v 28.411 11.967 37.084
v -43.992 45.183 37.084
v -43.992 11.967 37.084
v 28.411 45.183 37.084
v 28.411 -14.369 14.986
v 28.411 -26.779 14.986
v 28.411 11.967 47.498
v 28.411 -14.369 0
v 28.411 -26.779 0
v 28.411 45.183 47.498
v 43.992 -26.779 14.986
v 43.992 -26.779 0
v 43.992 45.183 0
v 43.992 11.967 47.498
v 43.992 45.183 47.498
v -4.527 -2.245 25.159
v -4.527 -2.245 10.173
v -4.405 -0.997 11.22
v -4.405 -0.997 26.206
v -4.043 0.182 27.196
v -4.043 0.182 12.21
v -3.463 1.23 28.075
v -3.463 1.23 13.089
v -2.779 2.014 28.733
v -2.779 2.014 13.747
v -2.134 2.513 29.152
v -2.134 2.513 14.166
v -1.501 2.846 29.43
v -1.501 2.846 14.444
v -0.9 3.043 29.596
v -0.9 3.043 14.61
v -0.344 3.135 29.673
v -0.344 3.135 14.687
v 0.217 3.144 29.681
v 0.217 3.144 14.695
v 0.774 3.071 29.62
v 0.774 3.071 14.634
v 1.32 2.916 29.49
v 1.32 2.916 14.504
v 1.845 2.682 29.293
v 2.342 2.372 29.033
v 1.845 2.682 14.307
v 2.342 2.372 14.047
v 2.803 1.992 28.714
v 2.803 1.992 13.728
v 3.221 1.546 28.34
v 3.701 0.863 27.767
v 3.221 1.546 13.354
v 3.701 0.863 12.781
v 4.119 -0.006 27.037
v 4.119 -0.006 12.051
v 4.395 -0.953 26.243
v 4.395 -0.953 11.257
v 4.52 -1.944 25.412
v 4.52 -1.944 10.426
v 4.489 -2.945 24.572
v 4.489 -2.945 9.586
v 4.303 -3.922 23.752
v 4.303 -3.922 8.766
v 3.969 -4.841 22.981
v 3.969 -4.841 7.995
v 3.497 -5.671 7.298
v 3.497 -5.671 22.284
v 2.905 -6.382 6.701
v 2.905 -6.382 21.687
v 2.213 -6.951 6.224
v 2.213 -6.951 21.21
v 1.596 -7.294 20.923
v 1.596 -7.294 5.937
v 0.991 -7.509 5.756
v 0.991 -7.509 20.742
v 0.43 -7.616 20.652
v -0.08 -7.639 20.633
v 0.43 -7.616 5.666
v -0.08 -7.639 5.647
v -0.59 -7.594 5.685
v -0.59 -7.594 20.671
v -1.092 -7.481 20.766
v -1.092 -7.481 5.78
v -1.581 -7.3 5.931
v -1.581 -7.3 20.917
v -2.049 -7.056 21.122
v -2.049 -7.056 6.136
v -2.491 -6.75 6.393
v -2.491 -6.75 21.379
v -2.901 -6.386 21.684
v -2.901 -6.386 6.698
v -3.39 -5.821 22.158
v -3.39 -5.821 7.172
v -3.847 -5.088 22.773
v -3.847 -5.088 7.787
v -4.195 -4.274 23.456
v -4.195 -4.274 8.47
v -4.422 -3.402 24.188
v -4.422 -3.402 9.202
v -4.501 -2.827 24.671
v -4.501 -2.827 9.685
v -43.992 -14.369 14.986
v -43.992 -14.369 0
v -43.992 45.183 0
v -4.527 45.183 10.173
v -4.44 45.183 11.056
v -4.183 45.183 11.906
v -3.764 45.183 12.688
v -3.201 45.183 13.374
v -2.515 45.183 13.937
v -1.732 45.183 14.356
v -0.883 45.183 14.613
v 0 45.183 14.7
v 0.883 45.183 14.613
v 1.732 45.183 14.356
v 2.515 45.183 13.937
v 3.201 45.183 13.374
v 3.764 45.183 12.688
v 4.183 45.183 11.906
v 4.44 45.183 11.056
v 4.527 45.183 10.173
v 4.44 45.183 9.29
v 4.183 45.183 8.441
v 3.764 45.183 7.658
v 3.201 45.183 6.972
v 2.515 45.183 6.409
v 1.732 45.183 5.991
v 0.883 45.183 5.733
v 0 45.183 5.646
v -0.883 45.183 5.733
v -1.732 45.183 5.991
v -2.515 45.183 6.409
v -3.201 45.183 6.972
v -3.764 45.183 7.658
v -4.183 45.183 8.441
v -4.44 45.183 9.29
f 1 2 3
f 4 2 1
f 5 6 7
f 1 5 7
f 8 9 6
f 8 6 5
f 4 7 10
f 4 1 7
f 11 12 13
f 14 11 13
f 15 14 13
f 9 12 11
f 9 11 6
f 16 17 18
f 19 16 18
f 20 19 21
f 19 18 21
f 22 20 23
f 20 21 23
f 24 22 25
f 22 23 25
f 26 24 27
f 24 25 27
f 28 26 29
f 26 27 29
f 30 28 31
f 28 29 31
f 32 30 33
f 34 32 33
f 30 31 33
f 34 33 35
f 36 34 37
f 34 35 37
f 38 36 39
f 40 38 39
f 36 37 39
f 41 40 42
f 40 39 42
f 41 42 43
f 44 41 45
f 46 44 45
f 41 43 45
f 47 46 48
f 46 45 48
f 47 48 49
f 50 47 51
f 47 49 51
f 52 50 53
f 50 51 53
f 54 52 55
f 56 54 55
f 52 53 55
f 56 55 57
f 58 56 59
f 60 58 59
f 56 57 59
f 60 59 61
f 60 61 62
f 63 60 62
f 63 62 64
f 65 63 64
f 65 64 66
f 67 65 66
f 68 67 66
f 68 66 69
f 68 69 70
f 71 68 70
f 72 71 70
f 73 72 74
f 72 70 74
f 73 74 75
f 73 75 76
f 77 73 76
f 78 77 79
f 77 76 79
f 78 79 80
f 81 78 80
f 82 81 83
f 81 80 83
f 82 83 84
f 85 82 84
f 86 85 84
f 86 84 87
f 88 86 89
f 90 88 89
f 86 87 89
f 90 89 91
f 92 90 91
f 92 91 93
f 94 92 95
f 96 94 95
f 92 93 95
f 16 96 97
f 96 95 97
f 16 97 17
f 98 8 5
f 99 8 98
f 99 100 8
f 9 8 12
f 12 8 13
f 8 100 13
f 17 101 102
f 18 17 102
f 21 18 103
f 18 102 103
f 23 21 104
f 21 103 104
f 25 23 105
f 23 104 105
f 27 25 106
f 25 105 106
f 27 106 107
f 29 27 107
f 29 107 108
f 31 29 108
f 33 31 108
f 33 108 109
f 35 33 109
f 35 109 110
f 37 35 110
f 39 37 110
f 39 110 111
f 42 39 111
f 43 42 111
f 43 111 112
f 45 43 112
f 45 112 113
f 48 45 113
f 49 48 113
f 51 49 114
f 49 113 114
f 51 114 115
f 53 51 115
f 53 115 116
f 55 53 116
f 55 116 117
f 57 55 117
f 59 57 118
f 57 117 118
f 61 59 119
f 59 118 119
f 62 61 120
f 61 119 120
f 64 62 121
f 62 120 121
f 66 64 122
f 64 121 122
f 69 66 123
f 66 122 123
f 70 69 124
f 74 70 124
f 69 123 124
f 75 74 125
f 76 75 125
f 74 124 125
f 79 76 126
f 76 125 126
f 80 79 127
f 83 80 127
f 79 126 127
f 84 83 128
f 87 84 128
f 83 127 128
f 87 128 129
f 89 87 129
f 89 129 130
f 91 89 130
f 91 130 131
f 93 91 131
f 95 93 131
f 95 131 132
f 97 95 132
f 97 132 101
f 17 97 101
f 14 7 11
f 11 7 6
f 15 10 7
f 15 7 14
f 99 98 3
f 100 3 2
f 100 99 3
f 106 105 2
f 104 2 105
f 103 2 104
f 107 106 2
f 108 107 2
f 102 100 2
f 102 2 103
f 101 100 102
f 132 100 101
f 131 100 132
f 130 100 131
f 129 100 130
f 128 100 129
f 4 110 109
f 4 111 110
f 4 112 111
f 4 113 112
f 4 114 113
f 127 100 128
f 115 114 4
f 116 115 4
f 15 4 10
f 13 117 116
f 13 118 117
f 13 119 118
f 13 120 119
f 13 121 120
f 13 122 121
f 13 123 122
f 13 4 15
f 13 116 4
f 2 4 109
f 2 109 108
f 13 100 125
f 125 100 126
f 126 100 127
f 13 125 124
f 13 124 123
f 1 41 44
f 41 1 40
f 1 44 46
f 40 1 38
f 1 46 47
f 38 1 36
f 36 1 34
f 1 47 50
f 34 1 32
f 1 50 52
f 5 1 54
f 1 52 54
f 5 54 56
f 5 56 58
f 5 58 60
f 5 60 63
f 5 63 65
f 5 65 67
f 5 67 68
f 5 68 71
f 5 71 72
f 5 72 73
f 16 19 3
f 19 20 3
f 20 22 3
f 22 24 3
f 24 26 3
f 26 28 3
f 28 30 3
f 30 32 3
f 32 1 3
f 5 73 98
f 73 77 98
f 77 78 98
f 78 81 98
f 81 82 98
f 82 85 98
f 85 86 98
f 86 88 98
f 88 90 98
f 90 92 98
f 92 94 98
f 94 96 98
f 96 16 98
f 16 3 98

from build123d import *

# Parameters (mm, degrees)
F0_W        = 72.4030919373
F0_H        = 90.3663933277
F2_DEPTH    = 22.098
F1_W        = 15.5804120004
F1_H        = 90.3663933277
F3_DEPTH    = 32.512
F4_T1_DEPTH = 219.7018507435
F5_T1_DEPTH = 310.1779296127
F6_R        = 4.5271504528
F7_DEPTH    = 71.9636861302
F8_DEPTH    = 14.986


# Not quite as in the source:
# - a fillet or chamfer that OpenCascade refuses, or shapes differently, is made with other operations: its cross-section is extruded or revolved along the edge and cut away or added


with BuildPart() as f2:
    # F0 (on Top) → F2 (new body)
    with BuildSketch(Plane.XY):
        with Locations((-7.7902060002, 0)):
            Rectangle(F0_W, F0_H)
    extrude(amount=F2_DEPTH)

    # F1 (on face) → F3 (join)
    with BuildSketch(Plane.XY):
        with Locations((36.2015459687, 0)):
            Rectangle(F1_W, F1_H)
    extrude(amount=F3_DEPTH)

    # F4: chamfer of 57.15 x 47.9545439218 on 1 edges, made by hand

    # F4_s2 → F4_t1 (cut)
    with BuildSketch(Plane.YZ.offset(-191.290510775)):
        Polygon((11.9668033361, 22.098), (-45.1831966639, -25.8565439218), (-45.1831966639, 22.098), align=None)
    extrude(amount=F4_T1_DEPTH, mode=Mode.SUBTRACT)

    # F5: chamfer of 57.15 x 47.9545439218 on 1 edges, made by hand

    # F5_s2 → F5_t1 (cut)
    with BuildSketch(Plane.YZ.offset(-118.8874188377)):
        Polygon((11.9668033361, 32.512), (-45.1831966639, -15.4425439218), (-45.1831966639, 32.512), align=None)
    extrude(amount=F5_T1_DEPTH, mode=Mode.SUBTRACT)

    # F6 (on face) → F7 (cut, through all)
    with BuildSketch(Plane(origin=(0, 45.1831966639, 0), x_dir=(-1, 0, 0), z_dir=(0, 1, 0))):
        with Locations((0, 10.1730925962)):
            Circle(F6_R)
    extrude(amount=-F7_DEPTH, mode=Mode.SUBTRACT)

    # F8 (add): faces of the model
    f8_faces = [f2.faces().sort_by_distance(p)[0] for p in [
        (-7.7902060002, 28.575, 22.098),
        (-8.1168519447, -1.1571124664, 11.0857270906),
        (36.2015459687, -7.4063430651, 16.256),
        (36.2015459687, 28.575, 32.512),
    ]]
    extrude(f8_faces, amount=F8_DEPTH, dir=(0, 0, 1))


solid = f2.part
